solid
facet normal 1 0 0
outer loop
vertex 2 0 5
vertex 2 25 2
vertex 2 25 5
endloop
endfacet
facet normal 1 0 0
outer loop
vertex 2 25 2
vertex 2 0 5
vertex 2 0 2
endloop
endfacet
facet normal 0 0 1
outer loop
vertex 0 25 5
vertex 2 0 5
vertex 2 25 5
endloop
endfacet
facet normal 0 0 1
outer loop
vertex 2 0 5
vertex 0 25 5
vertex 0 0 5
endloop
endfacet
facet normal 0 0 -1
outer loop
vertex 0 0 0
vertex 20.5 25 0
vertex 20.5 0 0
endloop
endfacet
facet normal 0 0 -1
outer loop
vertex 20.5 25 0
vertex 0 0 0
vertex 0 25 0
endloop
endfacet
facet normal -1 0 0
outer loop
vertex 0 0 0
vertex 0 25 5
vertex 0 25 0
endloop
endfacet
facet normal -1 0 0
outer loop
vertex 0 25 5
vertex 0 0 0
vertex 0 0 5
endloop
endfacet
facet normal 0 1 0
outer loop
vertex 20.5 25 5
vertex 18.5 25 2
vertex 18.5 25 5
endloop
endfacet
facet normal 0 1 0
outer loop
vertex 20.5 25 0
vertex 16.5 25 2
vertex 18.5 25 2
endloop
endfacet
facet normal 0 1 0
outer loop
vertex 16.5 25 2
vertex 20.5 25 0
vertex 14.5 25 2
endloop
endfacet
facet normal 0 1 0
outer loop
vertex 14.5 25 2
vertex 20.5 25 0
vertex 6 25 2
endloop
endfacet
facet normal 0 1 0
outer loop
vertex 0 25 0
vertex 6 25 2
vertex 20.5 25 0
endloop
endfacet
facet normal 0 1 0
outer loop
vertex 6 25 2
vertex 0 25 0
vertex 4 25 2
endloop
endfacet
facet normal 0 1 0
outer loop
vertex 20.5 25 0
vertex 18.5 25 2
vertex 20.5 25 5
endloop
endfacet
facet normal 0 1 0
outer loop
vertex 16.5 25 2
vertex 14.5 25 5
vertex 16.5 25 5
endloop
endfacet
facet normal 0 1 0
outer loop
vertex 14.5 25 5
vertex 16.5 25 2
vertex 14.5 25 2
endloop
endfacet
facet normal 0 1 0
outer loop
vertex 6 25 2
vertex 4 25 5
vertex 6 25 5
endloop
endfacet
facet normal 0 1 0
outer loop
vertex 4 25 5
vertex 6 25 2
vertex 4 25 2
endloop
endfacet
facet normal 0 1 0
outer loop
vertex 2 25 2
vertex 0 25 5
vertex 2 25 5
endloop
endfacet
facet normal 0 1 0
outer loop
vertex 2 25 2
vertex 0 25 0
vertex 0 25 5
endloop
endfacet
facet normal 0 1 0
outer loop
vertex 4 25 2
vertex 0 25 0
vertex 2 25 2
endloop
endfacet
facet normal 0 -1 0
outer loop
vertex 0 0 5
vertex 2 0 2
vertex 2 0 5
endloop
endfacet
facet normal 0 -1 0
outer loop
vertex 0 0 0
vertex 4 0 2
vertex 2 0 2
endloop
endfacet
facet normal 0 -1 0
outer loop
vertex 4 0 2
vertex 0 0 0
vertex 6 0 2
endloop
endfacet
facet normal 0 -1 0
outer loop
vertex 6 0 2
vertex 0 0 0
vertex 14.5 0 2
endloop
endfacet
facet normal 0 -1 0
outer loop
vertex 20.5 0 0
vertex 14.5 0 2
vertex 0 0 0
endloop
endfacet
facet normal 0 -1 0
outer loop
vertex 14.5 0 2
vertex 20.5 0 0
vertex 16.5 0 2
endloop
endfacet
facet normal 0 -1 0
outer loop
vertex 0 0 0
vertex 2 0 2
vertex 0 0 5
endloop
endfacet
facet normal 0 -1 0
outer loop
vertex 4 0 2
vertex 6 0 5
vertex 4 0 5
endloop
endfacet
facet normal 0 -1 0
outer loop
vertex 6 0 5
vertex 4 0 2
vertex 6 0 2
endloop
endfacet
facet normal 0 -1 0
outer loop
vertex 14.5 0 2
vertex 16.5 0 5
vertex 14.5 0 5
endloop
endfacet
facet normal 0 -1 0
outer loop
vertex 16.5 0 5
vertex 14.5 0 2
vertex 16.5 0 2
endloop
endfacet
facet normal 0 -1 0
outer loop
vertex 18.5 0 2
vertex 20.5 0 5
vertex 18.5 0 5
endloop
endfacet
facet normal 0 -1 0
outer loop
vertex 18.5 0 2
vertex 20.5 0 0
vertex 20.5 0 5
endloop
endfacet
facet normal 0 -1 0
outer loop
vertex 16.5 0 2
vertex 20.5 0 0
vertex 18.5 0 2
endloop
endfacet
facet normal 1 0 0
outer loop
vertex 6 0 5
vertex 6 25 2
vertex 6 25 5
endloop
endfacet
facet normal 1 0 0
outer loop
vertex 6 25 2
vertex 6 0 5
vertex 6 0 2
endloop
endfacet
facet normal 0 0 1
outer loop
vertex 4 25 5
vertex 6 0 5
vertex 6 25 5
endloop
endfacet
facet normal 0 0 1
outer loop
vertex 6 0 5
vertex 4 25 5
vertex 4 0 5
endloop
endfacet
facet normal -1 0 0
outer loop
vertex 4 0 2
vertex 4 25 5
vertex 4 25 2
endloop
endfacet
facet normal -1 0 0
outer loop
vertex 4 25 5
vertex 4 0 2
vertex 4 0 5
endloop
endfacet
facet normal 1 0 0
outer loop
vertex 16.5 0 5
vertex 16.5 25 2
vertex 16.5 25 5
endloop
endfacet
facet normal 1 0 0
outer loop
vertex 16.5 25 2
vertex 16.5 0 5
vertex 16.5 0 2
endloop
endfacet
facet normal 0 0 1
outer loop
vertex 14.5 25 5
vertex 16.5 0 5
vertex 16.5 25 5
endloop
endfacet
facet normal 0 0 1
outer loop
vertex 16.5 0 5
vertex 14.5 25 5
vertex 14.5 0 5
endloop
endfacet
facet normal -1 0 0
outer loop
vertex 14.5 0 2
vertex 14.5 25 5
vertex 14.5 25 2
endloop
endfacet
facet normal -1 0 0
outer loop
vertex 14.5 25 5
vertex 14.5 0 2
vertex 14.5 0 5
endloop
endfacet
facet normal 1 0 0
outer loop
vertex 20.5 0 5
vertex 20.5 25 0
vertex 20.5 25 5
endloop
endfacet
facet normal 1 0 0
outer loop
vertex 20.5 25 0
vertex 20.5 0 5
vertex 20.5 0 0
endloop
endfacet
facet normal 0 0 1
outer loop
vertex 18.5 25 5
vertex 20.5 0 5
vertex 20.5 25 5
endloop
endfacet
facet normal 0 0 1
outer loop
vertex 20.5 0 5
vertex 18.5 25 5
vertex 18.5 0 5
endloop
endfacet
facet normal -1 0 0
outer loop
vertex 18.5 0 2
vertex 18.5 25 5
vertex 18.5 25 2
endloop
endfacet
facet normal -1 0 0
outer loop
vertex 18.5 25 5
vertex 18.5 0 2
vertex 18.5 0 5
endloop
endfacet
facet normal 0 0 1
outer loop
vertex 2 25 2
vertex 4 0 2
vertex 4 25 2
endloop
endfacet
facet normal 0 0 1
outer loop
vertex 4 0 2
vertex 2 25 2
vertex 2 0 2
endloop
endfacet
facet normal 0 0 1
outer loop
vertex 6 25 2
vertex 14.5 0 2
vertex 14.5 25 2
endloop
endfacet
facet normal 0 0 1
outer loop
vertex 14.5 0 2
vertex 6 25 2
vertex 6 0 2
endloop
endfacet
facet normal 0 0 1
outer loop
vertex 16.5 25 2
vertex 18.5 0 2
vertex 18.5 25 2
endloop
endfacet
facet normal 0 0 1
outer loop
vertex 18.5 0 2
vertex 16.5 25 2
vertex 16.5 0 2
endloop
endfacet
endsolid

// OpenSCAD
PCB_Height = 2.0;
Spacer = 12.5;
Insert = 3;
Clip = 2;
Structure = 2;
Width = 25;

cube([Spacer+2*(PCB_Height+Clip), Width, Structure]);

for(o=[0, Clip+PCB_Height, PCB_Height+Spacer, Clip+2*PCB_Height+Spacer]) {
    translate([o,0,0]) cube([Clip, Width, Structure+Insert]);
}
